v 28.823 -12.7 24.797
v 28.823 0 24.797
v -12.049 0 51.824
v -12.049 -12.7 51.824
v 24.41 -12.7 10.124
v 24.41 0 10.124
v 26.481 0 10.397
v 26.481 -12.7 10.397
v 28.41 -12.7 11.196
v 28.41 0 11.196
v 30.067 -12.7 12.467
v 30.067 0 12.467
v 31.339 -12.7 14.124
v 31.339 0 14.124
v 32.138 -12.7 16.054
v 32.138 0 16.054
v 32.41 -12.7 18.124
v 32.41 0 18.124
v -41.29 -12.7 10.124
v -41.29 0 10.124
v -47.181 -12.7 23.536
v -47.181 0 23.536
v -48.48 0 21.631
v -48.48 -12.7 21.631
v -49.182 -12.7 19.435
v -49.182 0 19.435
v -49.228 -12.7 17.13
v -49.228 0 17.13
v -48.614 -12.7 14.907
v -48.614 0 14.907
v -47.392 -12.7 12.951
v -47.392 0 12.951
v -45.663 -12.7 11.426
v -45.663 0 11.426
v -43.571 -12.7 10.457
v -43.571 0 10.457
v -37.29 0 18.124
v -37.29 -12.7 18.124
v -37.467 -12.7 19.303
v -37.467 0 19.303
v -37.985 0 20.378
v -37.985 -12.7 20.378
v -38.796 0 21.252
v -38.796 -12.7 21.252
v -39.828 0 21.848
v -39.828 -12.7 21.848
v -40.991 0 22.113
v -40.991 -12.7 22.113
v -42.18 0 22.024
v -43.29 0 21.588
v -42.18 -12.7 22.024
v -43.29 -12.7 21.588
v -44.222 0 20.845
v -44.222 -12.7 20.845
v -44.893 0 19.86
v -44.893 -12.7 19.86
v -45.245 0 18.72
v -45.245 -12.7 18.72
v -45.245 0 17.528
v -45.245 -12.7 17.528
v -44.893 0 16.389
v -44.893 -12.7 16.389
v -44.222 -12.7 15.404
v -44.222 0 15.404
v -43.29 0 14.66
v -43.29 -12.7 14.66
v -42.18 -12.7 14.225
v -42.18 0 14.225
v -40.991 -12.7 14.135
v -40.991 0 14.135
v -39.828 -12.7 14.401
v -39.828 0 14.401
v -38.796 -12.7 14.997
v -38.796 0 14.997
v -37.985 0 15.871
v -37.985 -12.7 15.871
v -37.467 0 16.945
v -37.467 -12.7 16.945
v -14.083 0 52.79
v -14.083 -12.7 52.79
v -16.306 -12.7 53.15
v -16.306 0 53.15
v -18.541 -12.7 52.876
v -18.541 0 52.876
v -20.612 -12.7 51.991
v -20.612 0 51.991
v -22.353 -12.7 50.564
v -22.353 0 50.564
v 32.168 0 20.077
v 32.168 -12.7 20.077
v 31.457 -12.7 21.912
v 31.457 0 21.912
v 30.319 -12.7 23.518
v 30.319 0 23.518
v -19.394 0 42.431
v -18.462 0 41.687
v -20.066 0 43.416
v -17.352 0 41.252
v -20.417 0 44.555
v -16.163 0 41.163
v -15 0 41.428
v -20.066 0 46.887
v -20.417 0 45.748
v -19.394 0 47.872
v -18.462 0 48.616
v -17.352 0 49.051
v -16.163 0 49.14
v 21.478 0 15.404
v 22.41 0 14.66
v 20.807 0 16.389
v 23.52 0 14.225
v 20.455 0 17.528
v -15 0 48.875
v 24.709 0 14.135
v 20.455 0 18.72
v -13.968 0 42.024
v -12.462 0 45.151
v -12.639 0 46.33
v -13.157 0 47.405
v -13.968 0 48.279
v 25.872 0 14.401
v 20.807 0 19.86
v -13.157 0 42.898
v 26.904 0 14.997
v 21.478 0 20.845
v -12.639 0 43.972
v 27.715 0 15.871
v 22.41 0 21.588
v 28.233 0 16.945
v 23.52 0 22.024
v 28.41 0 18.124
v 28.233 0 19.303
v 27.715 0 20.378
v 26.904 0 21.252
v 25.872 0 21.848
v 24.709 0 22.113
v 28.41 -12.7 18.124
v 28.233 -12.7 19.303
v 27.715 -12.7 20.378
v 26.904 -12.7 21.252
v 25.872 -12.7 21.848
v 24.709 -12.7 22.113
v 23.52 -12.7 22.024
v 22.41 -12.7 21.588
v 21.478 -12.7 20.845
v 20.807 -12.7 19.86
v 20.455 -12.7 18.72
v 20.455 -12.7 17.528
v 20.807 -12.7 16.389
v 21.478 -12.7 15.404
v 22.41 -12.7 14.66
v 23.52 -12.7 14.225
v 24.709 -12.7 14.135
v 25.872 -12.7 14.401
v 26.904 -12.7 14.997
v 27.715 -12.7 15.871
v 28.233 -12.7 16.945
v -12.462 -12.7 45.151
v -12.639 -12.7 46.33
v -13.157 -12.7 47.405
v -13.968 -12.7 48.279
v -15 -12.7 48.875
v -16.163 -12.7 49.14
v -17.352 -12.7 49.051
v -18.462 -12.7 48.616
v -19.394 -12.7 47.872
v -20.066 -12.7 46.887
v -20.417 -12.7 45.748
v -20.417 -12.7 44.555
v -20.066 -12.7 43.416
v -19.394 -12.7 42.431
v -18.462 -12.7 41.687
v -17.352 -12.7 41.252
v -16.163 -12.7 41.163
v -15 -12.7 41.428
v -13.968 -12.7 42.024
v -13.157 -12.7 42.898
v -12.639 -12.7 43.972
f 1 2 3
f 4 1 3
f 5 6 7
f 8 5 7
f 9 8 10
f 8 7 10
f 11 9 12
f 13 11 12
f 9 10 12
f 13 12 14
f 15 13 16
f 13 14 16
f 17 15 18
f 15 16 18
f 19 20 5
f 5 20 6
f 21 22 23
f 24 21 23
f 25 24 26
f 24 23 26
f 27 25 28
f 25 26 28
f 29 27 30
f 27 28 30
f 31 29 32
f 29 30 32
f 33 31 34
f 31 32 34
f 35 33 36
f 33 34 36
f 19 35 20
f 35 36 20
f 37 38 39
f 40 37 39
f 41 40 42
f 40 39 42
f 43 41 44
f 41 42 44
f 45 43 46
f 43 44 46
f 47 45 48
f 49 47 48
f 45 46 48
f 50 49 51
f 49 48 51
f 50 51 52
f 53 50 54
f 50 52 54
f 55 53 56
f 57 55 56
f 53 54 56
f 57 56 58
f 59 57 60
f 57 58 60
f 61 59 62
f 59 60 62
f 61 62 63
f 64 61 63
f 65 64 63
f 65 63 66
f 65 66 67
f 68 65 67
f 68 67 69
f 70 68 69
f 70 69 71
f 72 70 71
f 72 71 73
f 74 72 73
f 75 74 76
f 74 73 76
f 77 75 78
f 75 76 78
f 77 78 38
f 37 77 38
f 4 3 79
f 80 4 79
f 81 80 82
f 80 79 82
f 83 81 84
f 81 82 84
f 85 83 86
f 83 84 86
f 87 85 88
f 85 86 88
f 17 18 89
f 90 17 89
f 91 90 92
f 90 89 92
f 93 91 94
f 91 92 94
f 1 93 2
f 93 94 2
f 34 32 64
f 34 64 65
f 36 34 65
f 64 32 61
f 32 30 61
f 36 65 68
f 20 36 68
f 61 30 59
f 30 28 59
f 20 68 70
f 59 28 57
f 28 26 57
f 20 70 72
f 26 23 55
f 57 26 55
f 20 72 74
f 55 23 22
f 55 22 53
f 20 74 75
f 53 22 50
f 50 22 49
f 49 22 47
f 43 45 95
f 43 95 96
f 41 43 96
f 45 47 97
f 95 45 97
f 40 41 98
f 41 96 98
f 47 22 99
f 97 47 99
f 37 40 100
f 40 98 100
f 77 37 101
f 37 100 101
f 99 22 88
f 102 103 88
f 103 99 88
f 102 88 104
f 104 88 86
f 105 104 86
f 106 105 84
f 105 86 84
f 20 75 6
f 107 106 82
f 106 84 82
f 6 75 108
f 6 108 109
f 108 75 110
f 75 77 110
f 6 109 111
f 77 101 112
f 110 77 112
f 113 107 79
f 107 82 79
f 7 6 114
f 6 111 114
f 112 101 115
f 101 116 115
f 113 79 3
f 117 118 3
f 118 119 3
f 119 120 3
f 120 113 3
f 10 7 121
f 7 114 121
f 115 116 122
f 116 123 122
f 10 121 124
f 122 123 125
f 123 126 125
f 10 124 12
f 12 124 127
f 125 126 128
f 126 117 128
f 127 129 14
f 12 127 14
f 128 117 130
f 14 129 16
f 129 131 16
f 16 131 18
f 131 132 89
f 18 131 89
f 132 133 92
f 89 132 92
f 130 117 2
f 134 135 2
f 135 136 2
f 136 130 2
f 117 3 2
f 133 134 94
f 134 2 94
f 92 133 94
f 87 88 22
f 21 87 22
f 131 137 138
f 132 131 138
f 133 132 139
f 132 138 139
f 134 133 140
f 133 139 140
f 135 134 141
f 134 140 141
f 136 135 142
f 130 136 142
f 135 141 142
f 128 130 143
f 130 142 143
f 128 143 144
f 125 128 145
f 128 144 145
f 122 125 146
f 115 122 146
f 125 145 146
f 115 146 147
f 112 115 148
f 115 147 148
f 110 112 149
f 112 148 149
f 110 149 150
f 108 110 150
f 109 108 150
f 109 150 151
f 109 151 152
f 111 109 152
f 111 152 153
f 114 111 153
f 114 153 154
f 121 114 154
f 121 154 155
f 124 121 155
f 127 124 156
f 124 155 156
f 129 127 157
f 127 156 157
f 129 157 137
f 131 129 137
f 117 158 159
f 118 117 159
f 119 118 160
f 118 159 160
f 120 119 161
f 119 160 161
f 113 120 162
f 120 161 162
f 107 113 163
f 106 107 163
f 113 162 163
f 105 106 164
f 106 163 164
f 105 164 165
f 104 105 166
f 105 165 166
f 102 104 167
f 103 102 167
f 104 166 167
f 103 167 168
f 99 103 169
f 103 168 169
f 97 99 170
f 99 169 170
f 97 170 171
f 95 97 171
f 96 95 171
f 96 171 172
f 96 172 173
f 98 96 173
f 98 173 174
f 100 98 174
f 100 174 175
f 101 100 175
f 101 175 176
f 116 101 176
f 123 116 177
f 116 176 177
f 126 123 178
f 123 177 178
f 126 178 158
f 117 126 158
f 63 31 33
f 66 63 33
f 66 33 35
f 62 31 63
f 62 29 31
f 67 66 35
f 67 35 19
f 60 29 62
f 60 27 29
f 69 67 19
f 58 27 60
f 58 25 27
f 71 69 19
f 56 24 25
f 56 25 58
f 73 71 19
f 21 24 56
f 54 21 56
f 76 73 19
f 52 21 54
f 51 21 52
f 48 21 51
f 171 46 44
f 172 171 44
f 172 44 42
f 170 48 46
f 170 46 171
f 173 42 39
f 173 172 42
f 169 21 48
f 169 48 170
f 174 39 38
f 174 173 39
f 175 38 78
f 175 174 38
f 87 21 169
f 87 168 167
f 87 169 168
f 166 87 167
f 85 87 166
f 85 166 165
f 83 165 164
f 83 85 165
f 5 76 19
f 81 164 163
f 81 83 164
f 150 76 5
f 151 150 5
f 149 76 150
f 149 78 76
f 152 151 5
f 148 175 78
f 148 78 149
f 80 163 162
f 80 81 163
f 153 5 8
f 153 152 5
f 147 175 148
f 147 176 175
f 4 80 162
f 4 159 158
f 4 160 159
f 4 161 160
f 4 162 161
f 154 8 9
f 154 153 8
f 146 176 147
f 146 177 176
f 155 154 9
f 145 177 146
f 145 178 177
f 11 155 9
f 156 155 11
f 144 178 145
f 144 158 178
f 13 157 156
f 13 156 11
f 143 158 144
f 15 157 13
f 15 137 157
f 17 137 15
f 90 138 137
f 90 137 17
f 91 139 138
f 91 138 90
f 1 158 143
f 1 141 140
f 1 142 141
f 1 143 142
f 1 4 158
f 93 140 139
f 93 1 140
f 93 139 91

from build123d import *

# Parameters (mm, degrees)
F1_DEPTH = 12.7
F2_R     = 4
F3_DEPTH = 12.7


with BuildPart() as f1:
    # F0 (on Front) → F1 (new body)
    with BuildSketch(Plane.XZ):
        with BuildLine():
            Line((-35.8775282965, 24.0157592565), (-21.8738068975, 39.259964286))
            ThreePointArc((-21.8738068975, 39.259964286), (-24.4545549996, 44.812447626), (-22.3532208609, 50.5635107317))
            Line((-22.3532208609, 50.5635107317), (-47.1810747422, 23.536345293))
            ThreePointArc((-47.1810747422, 23.536345293), (-41.6285914022, 26.1170933952), (-35.8775282965, 24.0157592565))
        make_face()
        with BuildLine():
            Line((-21.8738068975, 39.259964286), (-16.4617406563, 45.1514444906))
            Line((-16.4617406563, 45.1514444906), (-9.7887372084, 40.7388460516))
            ThreePointArc((-9.7887372084, 40.7388460516), (-8.8006693349, 42.8475377633), (-8.4617406563, 45.1514444906))
            ThreePointArc((-8.4617406563, 45.1514444906), (-9.4154371037, 48.939531903), (-12.0491422174, 51.8244479385))
            ThreePointArc((-12.0491422174, 51.8244479385), (-17.4334728618, 53.0922087183), (-22.3532208609, 50.5635107317))
            ThreePointArc((-22.3532208609, 50.5635107317), (-24.4545549996, 44.812447626), (-21.8738068975, 39.259964286))
        make_face()
        with BuildLine():
            ThreePointArc((-9.7887372084, 40.7388460516), (-15.4900084509, 37.2106802628), (-21.8738068975, 39.259964286))
            Line((-21.8738068975, 39.259964286), (-35.8775282965, 24.0157592565))
            ThreePointArc((-35.8775282965, 24.0157592565), (-33.9650969463, 21.3416902838), (-33.2895945376, 18.1242790519))
            Line((-33.2895945376, 18.1242790519), (16.4104054624, 18.1242790519))
            ThreePointArc((16.4104054624, 18.1242790519), (16.749334141, 20.4281857792), (17.7374020144, 22.5368774909))
            Line((17.7374020144, 22.5368774909), (-9.7887372084, 40.7388460516))
        make_face()
        with BuildLine():
            Line((-9.7887372084, 40.7388460516), (-16.4617406563, 45.1514444906))
            Line((-16.4617406563, 45.1514444906), (-21.8738068975, 39.259964286))
            ThreePointArc((-21.8738068975, 39.259964286), (-15.4900084509, 37.2106802628), (-9.7887372084, 40.7388460516))
        make_face()
        with BuildLine():
            ThreePointArc((-8.4617406563, 45.1514444906), (-8.8006693349, 42.8475377633), (-9.7887372084, 40.7388460516))
            Line((-9.7887372084, 40.7388460516), (17.7374020144, 22.5368774909))
            ThreePointArc((17.7374020144, 22.5368774909), (22.8120577523, 25.9629833197), (28.8230039014, 24.7972824999))
            Line((28.8230039014, 24.7972824999), (-12.0491422174, 51.8244479385))
            ThreePointArc((-12.0491422174, 51.8244479385), (-9.4154371037, 48.939531903), (-8.4617406563, 45.1514444906))
        make_face()
        with BuildLine():
            ThreePointArc((28.8230039014, 24.7972824999), (22.8120577523, 25.9629833197), (17.7374020144, 22.5368774909))
            Line((17.7374020144, 22.5368774909), (24.4104054624, 18.1242790519))
            Line((24.4104054624, 18.1242790519), (16.4104054624, 18.1242790519))
            ThreePointArc((16.4104054624, 18.1242790519), (18.7535512129, 12.4674248024), (24.4104054624, 10.1242790519))
            ThreePointArc((24.4104054624, 10.1242790519), (30.0672597119, 12.4674248024), (32.4104054624, 18.1242790519))
            ThreePointArc((32.4104054624, 18.1242790519), (31.456709015, 21.9123664643), (28.8230039014, 24.7972824999))
        make_face()
        with BuildLine():
            Line((24.4104054624, 18.1242790519), (17.7374020144, 22.5368774909))
            ThreePointArc((17.7374020144, 22.5368774909), (16.749334141, 20.4281857792), (16.4104054624, 18.1242790519))
            Line((16.4104054624, 18.1242790519), (24.4104054624, 18.1242790519))
        make_face()
        with BuildLine():
            Line((16.4104054624, 18.1242790519), (-33.2895945376, 18.1242790519))
            ThreePointArc((-33.2895945376, 18.1242790519), (-35.6327402881, 12.4674248024), (-41.2895945376, 10.1242790519))
            Line((-41.2895945376, 10.1242790519), (24.4104054624, 10.1242790519))
            ThreePointArc((24.4104054624, 10.1242790519), (18.7535512129, 12.4674248024), (16.4104054624, 18.1242790519))
        make_face()
        with BuildLine():
            Line((-41.2895945376, 18.1242790519), (-35.8775282965, 24.0157592565))
            ThreePointArc((-35.8775282965, 24.0157592565), (-41.6285914022, 26.1170933952), (-47.1810747422, 23.536345293))
            ThreePointArc((-47.1810747422, 23.536345293), (-48.6140921289, 14.90686782), (-41.2895945376, 10.1242790519))
            ThreePointArc((-41.2895945376, 10.1242790519), (-35.6327402881, 12.4674248024), (-33.2895945376, 18.1242790519))
            Line((-33.2895945376, 18.1242790519), (-41.2895945376, 18.1242790519))
        make_face()
        with BuildLine():
            ThreePointArc((-33.2895945376, 18.1242790519), (-33.9650969463, 21.3416902838), (-35.8775282965, 24.0157592565))
            Line((-35.8775282965, 24.0157592565), (-41.2895945376, 18.1242790519))
            Line((-41.2895945376, 18.1242790519), (-33.2895945376, 18.1242790519))
        make_face()
    extrude(amount=F1_DEPTH)

    # F2 (on face) → F3 (cut, through all)
    with BuildSketch(Plane.XZ.offset(12.7)):
        with Locations((-16.4617406563, 45.1514444906)):
            Circle(F2_R)
        with Locations((-41.2895945376, 18.1242790519)):
            Circle(F2_R)
        with Locations((24.4104054624, 18.1242790519)):
            Circle(F2_R)
    extrude(amount=-F3_DEPTH, mode=Mode.SUBTRACT)


solid = f1.part
